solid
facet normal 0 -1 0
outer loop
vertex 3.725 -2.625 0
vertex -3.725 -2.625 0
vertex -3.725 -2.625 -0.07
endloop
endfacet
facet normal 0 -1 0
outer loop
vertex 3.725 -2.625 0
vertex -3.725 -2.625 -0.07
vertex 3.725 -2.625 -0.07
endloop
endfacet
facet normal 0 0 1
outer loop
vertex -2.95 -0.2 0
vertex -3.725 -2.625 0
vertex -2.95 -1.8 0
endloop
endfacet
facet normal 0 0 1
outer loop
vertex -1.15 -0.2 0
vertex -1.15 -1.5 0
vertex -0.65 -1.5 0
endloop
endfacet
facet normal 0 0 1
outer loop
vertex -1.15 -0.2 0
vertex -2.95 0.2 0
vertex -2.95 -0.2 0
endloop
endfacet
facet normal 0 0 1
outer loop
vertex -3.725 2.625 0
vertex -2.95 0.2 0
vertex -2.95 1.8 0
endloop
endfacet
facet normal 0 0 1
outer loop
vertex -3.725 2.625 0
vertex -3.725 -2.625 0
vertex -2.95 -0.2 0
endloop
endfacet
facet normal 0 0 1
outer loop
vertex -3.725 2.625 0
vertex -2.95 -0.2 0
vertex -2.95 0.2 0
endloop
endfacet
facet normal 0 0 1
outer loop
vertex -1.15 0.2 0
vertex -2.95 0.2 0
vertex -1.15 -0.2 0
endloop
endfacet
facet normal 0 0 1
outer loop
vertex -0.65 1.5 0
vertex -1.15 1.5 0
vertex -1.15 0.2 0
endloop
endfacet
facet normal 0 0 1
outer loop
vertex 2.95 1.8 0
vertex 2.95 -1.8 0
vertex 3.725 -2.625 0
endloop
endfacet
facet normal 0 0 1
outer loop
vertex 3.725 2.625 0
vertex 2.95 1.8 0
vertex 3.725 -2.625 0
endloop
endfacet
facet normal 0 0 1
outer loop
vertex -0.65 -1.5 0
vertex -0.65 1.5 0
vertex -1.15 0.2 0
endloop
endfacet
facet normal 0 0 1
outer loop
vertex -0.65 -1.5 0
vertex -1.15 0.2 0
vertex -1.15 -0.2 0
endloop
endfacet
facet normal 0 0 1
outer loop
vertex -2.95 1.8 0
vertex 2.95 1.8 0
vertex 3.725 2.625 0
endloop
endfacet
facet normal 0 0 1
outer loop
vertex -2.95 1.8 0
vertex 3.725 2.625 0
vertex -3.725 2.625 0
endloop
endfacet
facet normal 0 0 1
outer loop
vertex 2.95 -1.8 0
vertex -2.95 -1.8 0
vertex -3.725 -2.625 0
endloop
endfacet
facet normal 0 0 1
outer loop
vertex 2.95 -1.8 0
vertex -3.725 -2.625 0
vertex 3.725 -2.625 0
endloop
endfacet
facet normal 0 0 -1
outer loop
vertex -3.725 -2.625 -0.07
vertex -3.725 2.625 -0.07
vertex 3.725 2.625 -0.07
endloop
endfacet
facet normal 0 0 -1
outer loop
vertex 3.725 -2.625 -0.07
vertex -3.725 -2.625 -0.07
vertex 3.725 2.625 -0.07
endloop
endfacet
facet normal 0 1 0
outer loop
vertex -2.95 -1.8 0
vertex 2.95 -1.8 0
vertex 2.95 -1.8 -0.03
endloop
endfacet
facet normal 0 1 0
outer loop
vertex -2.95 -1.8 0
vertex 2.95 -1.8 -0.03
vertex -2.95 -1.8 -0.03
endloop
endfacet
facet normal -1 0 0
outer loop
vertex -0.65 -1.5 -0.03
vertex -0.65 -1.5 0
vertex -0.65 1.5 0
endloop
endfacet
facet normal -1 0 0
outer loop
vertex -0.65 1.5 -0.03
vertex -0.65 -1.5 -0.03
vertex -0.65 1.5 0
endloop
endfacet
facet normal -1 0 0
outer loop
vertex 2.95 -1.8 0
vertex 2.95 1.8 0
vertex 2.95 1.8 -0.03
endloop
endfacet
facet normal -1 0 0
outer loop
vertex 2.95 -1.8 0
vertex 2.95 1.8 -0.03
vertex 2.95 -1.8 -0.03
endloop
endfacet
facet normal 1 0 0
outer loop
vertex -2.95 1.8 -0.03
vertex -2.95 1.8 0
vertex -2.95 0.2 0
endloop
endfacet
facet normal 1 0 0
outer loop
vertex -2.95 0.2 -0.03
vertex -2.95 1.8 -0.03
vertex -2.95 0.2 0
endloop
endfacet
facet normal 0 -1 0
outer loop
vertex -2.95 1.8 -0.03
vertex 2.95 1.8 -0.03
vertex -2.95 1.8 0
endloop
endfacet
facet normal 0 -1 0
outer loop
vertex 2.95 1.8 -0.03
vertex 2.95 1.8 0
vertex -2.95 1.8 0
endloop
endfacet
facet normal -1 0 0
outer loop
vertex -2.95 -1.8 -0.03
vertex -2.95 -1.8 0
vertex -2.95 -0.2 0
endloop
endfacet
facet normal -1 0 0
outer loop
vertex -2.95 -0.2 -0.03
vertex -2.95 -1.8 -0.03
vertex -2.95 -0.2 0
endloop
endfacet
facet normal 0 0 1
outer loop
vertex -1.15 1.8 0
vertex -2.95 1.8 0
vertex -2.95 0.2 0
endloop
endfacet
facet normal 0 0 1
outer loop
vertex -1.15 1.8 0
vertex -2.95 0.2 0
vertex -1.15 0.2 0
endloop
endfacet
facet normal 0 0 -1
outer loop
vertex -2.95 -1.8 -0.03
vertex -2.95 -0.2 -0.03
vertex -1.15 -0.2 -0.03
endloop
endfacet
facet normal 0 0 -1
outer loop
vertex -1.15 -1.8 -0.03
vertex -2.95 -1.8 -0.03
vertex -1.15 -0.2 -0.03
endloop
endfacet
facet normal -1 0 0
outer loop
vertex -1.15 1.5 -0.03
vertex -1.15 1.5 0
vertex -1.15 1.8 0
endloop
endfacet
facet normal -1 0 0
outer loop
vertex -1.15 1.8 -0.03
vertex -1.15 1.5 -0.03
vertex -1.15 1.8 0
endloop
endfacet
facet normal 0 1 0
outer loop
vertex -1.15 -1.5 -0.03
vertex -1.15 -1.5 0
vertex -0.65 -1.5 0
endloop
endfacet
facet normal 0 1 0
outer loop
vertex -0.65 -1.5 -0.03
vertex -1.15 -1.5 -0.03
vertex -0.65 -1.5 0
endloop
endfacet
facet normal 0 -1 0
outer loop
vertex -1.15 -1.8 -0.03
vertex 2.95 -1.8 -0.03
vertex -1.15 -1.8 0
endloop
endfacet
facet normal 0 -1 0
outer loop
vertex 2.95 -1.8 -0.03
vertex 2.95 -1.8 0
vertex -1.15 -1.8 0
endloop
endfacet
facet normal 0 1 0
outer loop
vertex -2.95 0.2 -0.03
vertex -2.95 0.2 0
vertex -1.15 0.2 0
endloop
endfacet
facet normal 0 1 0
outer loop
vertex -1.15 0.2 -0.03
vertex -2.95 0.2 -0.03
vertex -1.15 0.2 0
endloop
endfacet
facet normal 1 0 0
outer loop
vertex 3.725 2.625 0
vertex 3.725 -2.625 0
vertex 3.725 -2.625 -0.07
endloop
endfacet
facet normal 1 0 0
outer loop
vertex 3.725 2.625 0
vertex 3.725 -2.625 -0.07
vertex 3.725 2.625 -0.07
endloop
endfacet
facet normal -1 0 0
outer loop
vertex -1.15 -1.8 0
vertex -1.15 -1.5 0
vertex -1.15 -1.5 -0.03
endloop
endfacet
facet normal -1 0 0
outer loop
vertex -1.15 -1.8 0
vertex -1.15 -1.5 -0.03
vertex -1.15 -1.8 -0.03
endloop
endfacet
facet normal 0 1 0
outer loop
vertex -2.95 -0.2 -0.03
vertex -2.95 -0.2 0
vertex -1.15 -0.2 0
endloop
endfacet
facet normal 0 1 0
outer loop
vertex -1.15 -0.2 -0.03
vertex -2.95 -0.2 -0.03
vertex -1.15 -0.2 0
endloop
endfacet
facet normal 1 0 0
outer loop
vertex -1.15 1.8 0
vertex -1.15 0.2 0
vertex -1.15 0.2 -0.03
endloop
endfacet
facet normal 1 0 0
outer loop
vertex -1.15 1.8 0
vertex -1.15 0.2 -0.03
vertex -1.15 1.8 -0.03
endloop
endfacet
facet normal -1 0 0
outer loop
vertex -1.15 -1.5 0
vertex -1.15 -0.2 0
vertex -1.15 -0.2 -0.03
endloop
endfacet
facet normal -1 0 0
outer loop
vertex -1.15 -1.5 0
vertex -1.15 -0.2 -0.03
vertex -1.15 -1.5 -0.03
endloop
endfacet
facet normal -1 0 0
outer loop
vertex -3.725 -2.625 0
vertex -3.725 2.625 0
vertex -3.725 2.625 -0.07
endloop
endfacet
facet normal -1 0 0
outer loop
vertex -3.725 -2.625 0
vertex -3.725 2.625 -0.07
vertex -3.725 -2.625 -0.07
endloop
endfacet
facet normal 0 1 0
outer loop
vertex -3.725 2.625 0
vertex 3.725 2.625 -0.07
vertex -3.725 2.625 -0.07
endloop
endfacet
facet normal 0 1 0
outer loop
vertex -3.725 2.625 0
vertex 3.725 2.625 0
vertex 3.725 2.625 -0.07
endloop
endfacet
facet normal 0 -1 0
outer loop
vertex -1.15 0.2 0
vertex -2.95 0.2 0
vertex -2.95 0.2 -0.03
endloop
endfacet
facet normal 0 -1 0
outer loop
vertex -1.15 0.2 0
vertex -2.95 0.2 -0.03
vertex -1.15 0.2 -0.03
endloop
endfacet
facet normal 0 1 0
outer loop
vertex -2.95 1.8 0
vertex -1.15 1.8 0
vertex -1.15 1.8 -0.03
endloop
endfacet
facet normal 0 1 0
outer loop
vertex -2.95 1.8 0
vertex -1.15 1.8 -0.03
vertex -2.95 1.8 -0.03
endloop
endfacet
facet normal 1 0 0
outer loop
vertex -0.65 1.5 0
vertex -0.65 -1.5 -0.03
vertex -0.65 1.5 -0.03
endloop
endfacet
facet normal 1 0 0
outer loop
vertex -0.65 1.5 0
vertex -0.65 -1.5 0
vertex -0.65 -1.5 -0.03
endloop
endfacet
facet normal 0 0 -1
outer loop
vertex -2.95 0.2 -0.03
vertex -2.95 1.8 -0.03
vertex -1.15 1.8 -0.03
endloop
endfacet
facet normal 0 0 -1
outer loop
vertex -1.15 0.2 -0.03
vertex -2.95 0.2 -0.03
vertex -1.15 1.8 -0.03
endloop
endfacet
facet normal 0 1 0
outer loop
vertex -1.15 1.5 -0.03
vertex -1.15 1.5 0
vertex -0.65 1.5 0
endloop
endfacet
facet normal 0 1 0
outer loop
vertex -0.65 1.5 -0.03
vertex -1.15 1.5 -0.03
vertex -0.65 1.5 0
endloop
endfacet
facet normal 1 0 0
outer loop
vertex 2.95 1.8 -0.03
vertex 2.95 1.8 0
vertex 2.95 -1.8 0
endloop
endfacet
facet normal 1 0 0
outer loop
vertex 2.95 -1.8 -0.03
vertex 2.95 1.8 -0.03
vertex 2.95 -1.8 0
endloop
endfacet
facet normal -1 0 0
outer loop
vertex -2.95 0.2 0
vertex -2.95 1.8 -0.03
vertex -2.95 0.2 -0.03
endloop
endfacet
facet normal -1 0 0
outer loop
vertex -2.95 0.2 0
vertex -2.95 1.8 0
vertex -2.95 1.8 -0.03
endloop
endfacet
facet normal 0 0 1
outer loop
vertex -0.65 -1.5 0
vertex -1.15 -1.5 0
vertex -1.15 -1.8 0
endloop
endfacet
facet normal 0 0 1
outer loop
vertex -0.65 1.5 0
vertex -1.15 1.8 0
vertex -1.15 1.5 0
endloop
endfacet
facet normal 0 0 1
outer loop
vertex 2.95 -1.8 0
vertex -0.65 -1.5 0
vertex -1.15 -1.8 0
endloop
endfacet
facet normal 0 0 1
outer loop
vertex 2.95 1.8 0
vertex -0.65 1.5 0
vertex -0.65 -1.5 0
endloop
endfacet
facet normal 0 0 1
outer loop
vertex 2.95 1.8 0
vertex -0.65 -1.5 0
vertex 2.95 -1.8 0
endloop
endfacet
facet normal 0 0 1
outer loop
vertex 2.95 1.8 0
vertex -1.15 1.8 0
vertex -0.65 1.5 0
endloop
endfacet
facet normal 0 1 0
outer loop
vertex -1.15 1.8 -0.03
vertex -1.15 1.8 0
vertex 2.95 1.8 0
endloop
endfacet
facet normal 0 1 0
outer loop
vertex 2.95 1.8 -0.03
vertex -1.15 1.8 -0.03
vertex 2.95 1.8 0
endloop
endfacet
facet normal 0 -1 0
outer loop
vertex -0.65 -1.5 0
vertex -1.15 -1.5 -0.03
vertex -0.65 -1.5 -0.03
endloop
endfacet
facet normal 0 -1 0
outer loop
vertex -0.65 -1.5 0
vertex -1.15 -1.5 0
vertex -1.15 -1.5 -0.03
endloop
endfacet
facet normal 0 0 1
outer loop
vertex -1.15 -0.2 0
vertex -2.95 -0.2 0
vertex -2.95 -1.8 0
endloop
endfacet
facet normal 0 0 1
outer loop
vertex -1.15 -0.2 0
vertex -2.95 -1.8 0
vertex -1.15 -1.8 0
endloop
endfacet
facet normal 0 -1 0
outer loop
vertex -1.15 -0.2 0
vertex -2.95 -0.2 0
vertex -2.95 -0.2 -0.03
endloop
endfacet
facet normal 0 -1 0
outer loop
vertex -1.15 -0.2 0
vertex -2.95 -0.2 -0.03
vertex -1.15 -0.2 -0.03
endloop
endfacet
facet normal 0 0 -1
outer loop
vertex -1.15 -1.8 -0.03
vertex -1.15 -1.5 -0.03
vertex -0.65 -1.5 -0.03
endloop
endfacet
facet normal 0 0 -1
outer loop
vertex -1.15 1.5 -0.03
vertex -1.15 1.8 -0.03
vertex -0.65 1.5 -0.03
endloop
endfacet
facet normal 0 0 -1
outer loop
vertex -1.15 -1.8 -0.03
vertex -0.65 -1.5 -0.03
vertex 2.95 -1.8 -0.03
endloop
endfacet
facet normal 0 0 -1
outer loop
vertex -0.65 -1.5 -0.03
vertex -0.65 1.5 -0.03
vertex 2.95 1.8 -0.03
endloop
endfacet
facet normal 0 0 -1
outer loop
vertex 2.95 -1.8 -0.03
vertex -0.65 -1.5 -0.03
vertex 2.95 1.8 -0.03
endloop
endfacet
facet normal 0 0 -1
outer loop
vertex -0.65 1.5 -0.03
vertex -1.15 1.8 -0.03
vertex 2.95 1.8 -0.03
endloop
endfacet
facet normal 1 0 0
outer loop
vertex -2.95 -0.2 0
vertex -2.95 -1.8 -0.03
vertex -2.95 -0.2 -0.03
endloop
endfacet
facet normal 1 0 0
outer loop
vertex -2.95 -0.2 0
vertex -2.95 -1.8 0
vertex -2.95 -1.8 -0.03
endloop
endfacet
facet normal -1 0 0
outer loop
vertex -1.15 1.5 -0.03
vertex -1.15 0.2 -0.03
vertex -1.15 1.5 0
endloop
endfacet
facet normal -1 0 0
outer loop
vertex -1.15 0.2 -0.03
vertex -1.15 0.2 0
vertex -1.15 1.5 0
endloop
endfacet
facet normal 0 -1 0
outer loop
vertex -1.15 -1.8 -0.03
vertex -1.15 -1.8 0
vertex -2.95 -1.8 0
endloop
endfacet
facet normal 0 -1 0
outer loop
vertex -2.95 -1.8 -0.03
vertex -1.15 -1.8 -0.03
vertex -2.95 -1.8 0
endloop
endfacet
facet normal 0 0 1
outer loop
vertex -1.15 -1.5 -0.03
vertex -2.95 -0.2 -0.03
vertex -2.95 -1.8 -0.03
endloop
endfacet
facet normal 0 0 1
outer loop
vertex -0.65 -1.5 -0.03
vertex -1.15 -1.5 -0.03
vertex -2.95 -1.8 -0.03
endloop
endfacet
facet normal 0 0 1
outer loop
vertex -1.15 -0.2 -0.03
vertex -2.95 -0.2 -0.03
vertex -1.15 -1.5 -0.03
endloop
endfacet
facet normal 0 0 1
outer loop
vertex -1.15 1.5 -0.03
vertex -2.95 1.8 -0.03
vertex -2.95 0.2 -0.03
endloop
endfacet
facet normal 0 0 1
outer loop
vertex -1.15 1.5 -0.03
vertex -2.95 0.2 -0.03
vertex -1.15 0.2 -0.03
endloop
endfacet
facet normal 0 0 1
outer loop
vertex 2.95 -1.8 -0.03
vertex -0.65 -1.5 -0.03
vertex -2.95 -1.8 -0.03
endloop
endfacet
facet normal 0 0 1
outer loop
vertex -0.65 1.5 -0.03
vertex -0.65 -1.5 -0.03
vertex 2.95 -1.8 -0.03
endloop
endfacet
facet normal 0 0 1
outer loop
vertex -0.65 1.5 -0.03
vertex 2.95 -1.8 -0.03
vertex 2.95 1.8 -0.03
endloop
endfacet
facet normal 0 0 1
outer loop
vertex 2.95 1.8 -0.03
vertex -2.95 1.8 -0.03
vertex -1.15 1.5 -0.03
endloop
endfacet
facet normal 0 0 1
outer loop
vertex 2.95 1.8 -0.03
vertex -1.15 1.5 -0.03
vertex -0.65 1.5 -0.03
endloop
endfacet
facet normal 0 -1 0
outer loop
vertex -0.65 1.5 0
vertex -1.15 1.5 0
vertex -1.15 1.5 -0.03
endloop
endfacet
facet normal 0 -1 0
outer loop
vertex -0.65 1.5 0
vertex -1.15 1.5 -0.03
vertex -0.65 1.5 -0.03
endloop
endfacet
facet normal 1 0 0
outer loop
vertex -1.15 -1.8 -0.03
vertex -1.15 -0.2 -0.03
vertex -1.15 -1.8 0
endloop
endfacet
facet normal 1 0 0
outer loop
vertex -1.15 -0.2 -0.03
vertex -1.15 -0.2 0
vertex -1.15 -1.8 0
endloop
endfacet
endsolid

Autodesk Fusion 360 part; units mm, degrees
sketch "Sketch1" plane through (0, 0, 0) normal (0, 0, 1) x (1, 0, 0)
  line L0 (3.725, 2.625) -> (-3.725, 2.625)
  line L1 (-3.725, 2.625) -> (-3.725, -2.625)
  line L2 (-3.725, -2.625) -> (3.725, -2.625)
  line L3 (3.725, -2.625) -> (3.725, 2.625)
  line L4 (3.725, 2.625) -> (-3.725, -2.625) construction
  line L5 (-3.725, 2.625) -> (3.725, -2.625) construction
  line L6 (-0.65, 1.8) -> (2.95, 1.8)
  line L7 (2.95, 1.8) -> (2.95, -1.8)
  line L8 (2.95, -1.8) -> (-0.65, -1.8)
  line L9 (-0.65, -1.8) -> (-0.65, 1.8)
  line L10 (-3.725, 0) -> (3.725, 0) construction
  line L11 (-1.15, 1.8) -> (-2.95, 1.8)
  line L12 (-2.95, 1.8) -> (-2.95, 0.2)
  line L13 (-2.95, 0.2) -> (-1.15, 0.2)
  line L14 (-1.15, 0.2) -> (-1.15, 1.8)
  line L15 (-1.15, 1.5) -> (-0.65, 1.5)
  line L16 (-1.15, 1.8) -> (-0.65, 1.8)
  line L17 (-2.95, 1.8) -> (-3.725, 1.8) construction
  line L18 (2.95, 1.8) -> (3.725, 1.8) construction
  line L19 (-1.15, -1.8) -> (-2.95, -1.8)
  line L20 (-1.15, -0.2) -> (-1.15, -1.8)
  line L21 (-2.95, -0.2) -> (-1.15, -0.2)
  line L22 (-2.95, -1.8) -> (-2.95, -0.2)
  line L23 (-1.15, -1.5) -> (-0.65, -1.5)
  line L24 (-1.15, -1.8) -> (-0.65, -1.8)
  dimension "d1" = 5.25
  dimension "d2" = 7.45
  dimension "d5" = 3.6
  dimension "d6" = 3.6
  dimension "d8" = 1.8
  dimension "d9" = 1.6
  dimension "d11" = 0.3
  dimension "d12" = 0.5
extrude "Extrude1" add sketch "Sketch1" against normal blind 0.07 contours L0 L1 L2 L3 | L6 L7 L8 L9 | L9 L14 L15 L16 | L11 L12 L13 L14 | L9 L20 L23 L24 | L19 L20 L21 L22 makes body 1
extrude "Extrude2" add sketch "Sketch1" against normal blind 0.03 separate body contours L6 L7 L8 L9 | L9 L14 L15 L16 | L9 L20 L23 L24 makes body 2
extrude "Extrude3" add sketch "Sketch1" against normal blind 0.03 separate body contours L11 L12 L13 L14 | L19 L20 L21 L22 makes body 3 at (-1.75, -1.2667, 0) makes body 4 at (-2.35, 1.2667, 0)
combine "Combine1" operation cut target body 1 tool bodies 2 4 3 keep tools
